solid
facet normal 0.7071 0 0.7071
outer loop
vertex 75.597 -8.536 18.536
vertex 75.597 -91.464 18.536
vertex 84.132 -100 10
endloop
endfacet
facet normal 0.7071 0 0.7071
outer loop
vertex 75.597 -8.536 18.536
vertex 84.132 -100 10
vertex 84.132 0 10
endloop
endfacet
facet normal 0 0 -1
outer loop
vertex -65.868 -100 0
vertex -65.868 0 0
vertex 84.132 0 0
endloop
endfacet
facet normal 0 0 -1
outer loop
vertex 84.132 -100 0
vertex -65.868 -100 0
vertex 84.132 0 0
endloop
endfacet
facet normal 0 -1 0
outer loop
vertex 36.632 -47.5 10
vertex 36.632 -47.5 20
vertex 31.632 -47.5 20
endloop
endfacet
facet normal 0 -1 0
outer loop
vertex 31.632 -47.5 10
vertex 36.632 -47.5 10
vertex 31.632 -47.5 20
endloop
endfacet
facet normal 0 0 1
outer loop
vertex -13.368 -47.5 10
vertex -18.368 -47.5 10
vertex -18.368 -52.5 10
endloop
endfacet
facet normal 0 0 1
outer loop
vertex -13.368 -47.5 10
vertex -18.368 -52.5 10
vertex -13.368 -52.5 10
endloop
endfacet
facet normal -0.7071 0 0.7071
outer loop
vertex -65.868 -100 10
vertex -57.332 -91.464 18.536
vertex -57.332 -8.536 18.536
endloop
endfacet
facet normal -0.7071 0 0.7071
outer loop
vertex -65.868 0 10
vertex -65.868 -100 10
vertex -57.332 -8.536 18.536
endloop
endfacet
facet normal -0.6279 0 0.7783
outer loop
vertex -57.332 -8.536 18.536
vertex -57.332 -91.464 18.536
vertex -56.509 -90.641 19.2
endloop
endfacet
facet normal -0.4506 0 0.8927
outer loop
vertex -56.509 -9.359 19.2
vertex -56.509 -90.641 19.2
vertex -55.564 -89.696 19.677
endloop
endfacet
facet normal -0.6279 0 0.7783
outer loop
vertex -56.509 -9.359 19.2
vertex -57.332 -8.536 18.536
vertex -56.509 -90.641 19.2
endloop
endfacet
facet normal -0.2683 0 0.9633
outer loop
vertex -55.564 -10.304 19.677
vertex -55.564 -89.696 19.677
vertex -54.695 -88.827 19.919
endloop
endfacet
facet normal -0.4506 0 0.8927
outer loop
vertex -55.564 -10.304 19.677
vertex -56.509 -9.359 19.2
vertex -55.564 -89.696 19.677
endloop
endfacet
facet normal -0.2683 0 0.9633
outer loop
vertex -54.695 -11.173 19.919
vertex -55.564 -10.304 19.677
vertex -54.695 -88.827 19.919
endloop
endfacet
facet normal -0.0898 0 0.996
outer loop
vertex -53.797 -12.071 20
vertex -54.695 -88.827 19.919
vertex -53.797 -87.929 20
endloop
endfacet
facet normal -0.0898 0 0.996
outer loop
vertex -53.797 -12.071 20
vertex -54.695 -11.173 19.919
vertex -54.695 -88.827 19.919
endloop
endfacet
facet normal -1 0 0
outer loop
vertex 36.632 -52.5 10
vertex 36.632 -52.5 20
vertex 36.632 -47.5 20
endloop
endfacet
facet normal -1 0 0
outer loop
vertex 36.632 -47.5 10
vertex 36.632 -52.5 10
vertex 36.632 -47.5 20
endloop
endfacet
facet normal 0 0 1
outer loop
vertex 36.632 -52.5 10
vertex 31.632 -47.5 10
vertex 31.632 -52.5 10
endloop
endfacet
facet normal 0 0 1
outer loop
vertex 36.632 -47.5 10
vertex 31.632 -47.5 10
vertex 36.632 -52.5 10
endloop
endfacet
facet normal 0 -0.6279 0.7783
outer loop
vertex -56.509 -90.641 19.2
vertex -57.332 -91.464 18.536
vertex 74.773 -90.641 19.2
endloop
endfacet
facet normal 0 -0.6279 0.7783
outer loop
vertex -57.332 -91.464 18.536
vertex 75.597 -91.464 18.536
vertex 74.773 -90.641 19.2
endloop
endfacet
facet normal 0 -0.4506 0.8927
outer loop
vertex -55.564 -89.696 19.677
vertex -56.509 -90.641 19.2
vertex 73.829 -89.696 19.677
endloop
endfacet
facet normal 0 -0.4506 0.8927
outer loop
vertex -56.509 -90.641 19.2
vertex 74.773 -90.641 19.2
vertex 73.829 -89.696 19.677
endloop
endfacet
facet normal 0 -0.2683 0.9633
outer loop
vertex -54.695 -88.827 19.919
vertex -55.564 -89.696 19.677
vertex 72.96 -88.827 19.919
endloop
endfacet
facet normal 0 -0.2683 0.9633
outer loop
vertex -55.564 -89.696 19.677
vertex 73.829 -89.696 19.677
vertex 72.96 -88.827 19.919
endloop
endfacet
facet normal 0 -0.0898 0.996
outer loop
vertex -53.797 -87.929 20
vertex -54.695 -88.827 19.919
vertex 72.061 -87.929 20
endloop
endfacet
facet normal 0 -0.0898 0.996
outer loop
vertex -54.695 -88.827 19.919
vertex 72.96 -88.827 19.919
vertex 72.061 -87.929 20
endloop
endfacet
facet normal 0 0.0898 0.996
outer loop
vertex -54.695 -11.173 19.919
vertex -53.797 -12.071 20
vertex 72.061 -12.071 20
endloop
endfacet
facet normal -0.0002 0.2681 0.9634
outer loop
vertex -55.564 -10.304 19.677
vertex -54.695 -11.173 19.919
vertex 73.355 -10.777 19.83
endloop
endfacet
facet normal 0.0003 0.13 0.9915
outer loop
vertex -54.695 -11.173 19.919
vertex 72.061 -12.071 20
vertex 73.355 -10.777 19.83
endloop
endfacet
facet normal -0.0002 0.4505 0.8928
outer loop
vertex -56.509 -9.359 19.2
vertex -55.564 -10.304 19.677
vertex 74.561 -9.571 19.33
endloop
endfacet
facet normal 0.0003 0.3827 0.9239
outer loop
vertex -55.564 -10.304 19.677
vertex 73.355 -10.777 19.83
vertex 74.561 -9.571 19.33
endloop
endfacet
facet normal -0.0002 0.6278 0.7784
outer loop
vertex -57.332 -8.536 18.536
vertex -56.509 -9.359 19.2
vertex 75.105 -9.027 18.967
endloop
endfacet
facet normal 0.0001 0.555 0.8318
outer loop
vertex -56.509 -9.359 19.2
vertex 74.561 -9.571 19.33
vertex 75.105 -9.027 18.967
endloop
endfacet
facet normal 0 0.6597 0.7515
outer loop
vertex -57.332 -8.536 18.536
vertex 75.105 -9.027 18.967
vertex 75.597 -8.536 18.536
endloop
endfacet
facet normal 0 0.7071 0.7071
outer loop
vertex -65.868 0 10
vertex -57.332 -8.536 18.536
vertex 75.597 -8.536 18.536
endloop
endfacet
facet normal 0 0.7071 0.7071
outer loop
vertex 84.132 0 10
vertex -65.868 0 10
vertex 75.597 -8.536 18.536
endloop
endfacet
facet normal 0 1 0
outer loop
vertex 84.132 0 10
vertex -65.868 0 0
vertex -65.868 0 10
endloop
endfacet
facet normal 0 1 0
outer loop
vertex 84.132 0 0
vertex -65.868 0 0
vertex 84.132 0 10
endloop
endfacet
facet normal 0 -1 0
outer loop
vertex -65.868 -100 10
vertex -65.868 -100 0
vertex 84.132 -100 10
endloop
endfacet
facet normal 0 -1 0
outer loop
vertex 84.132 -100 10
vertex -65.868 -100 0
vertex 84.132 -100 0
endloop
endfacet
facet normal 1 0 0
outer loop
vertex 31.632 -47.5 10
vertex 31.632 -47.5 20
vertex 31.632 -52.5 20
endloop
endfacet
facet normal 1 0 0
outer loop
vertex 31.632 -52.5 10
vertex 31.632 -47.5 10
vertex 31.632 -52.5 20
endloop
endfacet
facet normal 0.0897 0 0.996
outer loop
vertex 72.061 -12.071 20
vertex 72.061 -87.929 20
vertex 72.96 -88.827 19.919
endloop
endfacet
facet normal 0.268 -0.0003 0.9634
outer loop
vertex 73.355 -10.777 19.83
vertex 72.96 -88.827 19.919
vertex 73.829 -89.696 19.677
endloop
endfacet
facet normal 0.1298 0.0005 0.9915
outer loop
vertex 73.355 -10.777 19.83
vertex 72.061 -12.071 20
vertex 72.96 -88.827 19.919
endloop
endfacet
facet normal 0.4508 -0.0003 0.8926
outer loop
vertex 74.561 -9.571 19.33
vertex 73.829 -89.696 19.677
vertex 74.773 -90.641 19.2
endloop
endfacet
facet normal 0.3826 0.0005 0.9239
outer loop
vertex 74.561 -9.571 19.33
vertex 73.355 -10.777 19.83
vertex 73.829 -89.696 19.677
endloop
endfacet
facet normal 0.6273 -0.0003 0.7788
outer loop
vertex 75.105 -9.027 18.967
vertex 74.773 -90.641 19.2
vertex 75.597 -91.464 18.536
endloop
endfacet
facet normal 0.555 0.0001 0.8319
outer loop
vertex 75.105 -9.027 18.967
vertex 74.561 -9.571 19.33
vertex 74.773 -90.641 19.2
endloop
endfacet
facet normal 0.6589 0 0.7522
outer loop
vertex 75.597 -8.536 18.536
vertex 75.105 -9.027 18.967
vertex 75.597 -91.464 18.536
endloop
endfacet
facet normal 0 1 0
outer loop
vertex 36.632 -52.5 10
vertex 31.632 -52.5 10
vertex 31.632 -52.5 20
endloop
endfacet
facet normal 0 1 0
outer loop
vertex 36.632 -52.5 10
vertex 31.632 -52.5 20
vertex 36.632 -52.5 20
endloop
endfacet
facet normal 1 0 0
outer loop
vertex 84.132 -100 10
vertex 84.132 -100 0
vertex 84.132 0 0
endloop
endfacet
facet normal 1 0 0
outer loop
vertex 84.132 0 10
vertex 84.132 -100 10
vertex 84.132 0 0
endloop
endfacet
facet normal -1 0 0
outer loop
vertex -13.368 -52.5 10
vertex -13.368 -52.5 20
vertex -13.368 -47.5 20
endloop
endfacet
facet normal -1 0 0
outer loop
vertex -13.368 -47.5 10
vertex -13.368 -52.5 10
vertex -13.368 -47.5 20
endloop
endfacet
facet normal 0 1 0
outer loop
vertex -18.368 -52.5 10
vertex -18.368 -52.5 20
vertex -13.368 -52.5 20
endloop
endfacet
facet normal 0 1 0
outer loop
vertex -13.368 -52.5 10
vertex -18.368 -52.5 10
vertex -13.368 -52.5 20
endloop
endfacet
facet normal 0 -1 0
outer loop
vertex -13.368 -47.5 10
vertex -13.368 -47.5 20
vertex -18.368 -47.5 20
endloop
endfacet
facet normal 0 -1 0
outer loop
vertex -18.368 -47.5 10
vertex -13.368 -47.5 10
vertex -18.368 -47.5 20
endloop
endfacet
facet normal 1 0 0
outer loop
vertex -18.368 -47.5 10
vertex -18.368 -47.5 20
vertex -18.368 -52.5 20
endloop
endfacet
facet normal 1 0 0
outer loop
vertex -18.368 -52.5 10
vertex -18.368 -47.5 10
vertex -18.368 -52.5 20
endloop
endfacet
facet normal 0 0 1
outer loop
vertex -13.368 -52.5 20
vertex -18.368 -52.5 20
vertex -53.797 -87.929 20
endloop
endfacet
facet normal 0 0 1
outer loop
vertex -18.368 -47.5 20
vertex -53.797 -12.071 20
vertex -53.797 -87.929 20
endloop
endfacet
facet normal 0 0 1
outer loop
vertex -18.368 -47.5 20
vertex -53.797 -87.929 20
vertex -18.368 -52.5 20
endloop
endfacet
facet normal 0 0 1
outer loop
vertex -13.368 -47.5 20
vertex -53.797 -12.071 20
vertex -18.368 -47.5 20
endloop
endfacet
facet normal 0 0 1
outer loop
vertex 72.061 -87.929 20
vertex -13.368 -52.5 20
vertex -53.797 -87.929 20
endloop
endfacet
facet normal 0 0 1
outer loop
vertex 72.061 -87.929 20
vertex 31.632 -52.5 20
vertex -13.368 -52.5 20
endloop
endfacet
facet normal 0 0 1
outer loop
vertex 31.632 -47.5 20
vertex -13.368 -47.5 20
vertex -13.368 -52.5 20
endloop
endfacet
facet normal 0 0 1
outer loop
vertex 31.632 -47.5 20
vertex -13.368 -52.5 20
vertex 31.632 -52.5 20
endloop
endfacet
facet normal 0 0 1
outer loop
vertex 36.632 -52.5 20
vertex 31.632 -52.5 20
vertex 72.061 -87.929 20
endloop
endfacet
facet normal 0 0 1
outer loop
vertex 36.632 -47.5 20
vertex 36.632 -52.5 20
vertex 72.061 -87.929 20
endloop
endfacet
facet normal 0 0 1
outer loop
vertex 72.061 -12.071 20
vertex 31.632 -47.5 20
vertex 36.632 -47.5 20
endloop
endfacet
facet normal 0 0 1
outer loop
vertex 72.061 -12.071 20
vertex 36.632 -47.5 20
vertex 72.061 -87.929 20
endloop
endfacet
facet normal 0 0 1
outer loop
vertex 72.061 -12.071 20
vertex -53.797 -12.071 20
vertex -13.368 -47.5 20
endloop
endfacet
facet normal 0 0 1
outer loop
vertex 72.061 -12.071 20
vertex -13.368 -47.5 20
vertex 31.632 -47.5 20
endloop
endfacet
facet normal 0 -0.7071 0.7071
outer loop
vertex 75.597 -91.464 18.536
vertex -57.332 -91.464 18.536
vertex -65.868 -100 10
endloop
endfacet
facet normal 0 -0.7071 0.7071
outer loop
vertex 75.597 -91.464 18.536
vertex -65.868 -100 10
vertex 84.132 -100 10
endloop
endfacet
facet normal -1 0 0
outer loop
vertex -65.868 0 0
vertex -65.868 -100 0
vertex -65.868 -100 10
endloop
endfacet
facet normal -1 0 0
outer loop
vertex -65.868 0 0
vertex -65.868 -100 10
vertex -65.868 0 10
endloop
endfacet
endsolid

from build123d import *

# Parameters (mm, degrees)
F0_W     = 150
F0_H     = 100
F1_DEPTH = 20
F2_SIZE  = 10
F3_W     = 2.5
F3_H     = 2.5
F4_DEPTH = 10
F5_R     = 5


with BuildPart() as f1:
    # F0 (on Top) → F1 (new body)
    with BuildSketch(Plane.XY):
        with Locations((9.132270515, -50)):
            Rectangle(F0_W, F0_H)
    extrude(amount=F1_DEPTH)

    # F2
    f2_edges = [f1.edges().sort_by_distance(p)[0] for p in [
        (9.132271, -100, 20),
        (-65.867729, -50, 20),
        (9.132271, 0, 20),
        (84.132271, -50, 20),
    ]]
    chamfer(f2_edges, length=F2_SIZE)

    # F3 (on face) → F4 (cut)
    with BuildSketch(Plane.XY.offset(20)):
        Polygon((-18.367729485, -47.5), (-18.367729485, -50), (-15.867729485, -50), (-13.367729485, -50), (-13.367729485, -47.5), (-15.867729485, -47.5), align=None)
        Polygon((-15.867729485, -50), (-18.367729485, -50), (-18.367729485, -52.5), (-13.367729485, -52.5), (-13.367729485, -50), align=None)
        with Locations((32.882270515, -48.75)):
            Rectangle(F3_W, F3_H)
        Polygon((34.132270515, -50), (31.632270515, -50), (31.632270515, -52.5), (36.632270515, -52.5), (36.632270515, -50), align=None)
        with Locations((35.382270515, -48.75)):
            Rectangle(F3_W, F3_H)
    extrude(amount=-F4_DEPTH, mode=Mode.SUBTRACT)

    # F5
    f5_edges = [f1.edges().sort_by_distance(p)[0] for p in [
        (9.132271, -90, 20),
        (-55.867729, -50, 20),
        (74.132271, -50, 20),
        (9.132271, -10, 20),
    ]]
    fillet(f5_edges, radius=F5_R)


solid = f1.part
